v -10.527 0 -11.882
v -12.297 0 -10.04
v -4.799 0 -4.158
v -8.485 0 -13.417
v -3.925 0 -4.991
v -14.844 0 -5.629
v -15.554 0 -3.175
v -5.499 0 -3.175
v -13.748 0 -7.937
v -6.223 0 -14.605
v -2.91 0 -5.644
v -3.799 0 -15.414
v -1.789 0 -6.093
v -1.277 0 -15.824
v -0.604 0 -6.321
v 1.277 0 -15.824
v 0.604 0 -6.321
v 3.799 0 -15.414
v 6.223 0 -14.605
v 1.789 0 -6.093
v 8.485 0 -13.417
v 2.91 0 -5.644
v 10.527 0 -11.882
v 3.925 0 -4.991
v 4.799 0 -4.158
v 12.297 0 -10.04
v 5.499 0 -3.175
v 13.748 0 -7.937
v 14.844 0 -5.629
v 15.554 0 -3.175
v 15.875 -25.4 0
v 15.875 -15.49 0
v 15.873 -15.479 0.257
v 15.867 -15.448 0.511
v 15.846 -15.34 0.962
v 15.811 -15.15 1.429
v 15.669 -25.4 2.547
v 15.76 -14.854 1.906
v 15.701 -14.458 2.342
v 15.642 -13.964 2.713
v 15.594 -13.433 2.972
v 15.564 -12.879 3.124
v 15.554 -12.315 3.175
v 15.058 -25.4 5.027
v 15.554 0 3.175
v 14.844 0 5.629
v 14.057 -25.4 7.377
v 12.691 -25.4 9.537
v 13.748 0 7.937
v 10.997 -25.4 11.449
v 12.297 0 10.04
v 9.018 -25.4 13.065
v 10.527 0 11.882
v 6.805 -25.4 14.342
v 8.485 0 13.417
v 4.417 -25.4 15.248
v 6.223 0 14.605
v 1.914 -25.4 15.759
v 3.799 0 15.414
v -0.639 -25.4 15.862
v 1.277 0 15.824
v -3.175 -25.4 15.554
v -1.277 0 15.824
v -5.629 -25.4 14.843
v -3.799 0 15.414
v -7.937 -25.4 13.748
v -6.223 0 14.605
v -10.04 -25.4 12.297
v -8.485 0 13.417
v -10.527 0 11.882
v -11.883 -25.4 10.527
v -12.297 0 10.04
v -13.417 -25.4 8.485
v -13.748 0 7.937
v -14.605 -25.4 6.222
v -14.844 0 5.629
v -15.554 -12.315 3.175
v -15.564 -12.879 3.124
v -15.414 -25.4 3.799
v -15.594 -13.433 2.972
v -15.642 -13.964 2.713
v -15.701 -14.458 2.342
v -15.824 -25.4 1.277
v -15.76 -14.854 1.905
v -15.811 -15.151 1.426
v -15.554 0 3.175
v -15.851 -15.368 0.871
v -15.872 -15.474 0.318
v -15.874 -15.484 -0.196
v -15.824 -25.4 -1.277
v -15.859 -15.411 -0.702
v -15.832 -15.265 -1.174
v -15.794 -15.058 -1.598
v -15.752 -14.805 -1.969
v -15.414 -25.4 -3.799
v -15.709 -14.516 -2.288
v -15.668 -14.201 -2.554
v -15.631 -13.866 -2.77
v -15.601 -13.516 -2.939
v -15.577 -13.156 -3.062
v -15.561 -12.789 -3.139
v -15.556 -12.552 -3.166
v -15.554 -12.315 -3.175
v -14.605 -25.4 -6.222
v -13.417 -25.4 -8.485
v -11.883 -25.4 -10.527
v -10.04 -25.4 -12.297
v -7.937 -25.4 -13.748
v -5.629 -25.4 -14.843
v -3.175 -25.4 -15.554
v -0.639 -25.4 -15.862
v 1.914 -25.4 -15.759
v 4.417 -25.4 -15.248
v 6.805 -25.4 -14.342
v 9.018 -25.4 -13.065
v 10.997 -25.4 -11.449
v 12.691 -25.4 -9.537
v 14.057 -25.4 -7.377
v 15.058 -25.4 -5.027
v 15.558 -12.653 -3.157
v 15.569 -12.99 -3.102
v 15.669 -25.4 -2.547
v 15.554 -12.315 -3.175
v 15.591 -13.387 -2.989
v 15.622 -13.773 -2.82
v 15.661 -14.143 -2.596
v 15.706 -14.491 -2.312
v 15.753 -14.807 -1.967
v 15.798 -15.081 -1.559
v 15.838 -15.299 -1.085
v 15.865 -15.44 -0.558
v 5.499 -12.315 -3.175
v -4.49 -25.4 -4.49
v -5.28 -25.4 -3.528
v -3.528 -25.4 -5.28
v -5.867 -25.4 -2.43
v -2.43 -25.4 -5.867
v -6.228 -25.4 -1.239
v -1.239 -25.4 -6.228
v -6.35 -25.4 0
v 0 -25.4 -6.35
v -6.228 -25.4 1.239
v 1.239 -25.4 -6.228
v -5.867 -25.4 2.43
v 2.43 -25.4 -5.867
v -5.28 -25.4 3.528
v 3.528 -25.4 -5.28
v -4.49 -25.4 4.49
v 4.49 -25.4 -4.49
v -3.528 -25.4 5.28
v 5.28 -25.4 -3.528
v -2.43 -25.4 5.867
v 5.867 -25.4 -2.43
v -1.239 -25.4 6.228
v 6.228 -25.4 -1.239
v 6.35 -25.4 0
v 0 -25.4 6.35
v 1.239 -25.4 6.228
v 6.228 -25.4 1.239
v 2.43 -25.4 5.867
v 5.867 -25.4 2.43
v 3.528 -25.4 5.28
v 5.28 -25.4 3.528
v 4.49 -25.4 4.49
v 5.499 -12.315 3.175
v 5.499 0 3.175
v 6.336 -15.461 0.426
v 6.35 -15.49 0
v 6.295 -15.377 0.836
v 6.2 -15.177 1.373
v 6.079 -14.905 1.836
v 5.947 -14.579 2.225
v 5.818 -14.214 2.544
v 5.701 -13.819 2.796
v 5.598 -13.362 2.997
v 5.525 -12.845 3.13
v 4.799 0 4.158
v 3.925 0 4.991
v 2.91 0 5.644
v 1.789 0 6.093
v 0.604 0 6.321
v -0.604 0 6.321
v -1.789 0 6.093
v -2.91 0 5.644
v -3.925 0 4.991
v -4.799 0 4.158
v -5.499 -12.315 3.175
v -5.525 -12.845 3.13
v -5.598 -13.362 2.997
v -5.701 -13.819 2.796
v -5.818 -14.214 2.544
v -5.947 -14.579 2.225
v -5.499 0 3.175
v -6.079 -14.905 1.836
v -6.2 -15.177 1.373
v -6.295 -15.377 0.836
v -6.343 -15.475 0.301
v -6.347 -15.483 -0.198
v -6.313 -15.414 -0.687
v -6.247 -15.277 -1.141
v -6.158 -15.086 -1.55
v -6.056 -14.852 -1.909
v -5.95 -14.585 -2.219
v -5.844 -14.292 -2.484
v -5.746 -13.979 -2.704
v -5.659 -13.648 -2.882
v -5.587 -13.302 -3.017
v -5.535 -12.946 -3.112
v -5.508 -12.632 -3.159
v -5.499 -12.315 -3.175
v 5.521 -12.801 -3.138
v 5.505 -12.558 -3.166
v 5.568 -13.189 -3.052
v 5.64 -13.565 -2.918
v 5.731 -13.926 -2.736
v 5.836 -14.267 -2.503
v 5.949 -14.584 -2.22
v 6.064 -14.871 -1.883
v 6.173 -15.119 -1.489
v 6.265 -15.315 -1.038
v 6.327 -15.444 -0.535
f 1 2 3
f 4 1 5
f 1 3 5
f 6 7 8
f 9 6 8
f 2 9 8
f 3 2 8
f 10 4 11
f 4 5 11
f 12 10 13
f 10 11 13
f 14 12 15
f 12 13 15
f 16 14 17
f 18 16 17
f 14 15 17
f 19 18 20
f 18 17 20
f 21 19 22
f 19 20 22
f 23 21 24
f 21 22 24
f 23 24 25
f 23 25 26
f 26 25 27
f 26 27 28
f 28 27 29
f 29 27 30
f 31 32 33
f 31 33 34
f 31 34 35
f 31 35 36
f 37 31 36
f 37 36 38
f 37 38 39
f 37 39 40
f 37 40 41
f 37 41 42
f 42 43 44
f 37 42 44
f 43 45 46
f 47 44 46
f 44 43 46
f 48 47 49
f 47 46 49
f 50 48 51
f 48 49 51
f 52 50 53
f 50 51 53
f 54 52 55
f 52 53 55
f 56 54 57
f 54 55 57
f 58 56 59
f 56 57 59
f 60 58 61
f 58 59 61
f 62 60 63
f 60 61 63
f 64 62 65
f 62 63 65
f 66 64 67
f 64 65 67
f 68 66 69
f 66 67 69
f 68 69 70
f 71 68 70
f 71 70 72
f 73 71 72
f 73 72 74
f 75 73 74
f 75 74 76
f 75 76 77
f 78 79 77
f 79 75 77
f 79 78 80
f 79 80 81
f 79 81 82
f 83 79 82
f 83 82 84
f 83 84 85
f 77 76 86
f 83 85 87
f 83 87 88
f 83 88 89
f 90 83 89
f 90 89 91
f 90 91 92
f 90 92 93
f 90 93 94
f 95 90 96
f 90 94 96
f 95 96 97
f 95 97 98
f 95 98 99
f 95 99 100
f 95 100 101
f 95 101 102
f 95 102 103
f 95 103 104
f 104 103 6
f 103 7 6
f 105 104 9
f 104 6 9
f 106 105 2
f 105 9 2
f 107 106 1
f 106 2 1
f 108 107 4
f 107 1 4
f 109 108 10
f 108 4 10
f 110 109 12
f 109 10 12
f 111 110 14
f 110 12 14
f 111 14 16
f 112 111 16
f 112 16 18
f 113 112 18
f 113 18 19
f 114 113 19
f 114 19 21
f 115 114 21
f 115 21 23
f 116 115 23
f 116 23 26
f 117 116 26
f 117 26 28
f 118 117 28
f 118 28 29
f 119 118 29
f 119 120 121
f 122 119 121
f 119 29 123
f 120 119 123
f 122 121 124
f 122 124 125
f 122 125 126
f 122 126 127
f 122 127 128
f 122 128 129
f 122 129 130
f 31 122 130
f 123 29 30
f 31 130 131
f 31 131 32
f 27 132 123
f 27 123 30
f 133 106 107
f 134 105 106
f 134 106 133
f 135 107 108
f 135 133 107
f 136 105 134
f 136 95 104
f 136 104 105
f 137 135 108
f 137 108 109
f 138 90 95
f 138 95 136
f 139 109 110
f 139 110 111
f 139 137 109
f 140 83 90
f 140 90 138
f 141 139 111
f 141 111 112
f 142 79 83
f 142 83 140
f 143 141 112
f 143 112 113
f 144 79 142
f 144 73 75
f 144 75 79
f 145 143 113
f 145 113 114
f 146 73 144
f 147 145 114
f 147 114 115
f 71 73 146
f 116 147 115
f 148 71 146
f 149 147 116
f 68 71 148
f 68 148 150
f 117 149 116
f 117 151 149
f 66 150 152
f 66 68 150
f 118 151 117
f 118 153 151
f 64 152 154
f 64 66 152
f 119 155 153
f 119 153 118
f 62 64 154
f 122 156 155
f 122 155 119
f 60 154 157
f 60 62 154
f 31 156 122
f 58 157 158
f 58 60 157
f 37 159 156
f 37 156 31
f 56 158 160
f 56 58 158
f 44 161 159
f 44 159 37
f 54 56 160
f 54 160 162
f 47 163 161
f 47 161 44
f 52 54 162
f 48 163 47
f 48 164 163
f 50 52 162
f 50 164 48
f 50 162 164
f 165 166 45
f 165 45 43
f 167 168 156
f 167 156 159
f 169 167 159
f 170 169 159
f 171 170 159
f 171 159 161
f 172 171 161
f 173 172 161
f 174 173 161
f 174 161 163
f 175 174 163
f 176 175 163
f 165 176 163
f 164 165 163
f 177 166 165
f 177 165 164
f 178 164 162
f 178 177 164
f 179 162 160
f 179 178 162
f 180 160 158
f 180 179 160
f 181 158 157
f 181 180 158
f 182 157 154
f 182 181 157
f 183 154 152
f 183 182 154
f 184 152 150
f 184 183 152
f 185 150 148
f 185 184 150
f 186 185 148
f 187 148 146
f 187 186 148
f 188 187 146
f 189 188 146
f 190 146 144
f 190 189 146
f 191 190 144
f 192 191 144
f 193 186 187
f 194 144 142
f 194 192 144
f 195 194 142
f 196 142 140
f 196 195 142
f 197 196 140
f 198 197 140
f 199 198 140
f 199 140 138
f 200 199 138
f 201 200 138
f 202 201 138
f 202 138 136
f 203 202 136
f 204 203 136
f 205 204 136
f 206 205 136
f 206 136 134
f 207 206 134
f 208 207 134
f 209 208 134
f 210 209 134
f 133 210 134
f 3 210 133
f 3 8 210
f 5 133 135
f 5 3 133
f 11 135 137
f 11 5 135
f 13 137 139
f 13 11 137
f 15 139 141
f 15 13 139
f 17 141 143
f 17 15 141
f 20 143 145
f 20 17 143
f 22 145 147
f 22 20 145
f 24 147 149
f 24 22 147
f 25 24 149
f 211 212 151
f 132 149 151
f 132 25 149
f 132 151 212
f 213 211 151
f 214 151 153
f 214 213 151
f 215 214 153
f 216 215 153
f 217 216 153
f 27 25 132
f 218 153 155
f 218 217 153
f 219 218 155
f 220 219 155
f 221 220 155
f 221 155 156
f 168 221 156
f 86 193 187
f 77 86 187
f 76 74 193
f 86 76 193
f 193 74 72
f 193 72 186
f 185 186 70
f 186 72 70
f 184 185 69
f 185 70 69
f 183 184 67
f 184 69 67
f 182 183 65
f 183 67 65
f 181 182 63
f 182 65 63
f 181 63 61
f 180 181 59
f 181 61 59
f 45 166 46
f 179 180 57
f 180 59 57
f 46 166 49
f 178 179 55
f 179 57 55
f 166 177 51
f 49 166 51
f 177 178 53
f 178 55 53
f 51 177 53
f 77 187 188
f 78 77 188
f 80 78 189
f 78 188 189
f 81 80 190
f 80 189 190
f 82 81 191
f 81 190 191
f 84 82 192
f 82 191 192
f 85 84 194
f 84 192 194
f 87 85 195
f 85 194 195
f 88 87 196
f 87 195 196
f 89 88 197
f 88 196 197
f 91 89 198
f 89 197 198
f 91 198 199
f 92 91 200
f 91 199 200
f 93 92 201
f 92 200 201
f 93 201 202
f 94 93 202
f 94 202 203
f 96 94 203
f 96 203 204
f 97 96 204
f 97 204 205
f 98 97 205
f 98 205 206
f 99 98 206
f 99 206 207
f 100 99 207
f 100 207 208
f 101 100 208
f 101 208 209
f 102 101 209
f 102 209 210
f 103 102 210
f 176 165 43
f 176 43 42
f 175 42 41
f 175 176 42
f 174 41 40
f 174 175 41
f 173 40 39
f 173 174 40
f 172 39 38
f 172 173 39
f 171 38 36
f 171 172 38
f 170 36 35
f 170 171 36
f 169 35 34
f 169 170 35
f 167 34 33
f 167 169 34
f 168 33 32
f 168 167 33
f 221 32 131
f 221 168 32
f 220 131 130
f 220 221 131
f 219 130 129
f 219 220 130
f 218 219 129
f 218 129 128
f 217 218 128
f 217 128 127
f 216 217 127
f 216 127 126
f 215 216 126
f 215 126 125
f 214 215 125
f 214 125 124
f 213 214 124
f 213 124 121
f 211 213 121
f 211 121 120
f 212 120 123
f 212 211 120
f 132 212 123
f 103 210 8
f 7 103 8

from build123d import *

# Parameters (mm, degrees)
F0_R     = 15.875
F0_R_2   = 6.35
F1_DEPTH = 25.4
F2_R     = 3.175
F3_DEPTH = 25.4
F5_DEPTH = 25.4
F6_DEPTH = 25.4


with BuildPart() as f1:
    # F0 (on Front) → F1 (new body)
    with BuildSketch(Plane.XZ):
        Circle(F0_R)
        Circle(F0_R_2, mode=Mode.SUBTRACT)
    extrude(amount=F1_DEPTH)

    # F2 (on Right) → F3 (cut)
    with BuildSketch(Plane.YZ):
        Circle(F2_R)
    extrude(amount=-F3_DEPTH, mode=Mode.SUBTRACT)

    # F4 (on Right) → F5 (cut)
    with BuildSketch(Plane.YZ):
        with BuildLine():
            Line((0, 3.175), (-12.31459, 3.175))
            ThreePointArc((-12.31459, 3.175), (-15.48959, 0), (-12.31459, -3.175))
            Line((-12.31459, -3.175), (0, -3.175))
            Line((0, -3.175), (0, 3.175))
        make_face()
    extrude(amount=F5_DEPTH, mode=Mode.SUBTRACT)

    # F4 (on Right) → F6 (cut)
    with BuildSketch(Plane.YZ):
        with BuildLine():
            Line((0, 3.175), (-12.31459, 3.175))
            ThreePointArc((-12.31459, 3.175), (-15.48959, 0), (-12.31459, -3.175))
            Line((-12.31459, -3.175), (0, -3.175))
            Line((0, -3.175), (0, 3.175))
        make_face()
    extrude(amount=-F6_DEPTH, mode=Mode.SUBTRACT)


solid = f1.part
